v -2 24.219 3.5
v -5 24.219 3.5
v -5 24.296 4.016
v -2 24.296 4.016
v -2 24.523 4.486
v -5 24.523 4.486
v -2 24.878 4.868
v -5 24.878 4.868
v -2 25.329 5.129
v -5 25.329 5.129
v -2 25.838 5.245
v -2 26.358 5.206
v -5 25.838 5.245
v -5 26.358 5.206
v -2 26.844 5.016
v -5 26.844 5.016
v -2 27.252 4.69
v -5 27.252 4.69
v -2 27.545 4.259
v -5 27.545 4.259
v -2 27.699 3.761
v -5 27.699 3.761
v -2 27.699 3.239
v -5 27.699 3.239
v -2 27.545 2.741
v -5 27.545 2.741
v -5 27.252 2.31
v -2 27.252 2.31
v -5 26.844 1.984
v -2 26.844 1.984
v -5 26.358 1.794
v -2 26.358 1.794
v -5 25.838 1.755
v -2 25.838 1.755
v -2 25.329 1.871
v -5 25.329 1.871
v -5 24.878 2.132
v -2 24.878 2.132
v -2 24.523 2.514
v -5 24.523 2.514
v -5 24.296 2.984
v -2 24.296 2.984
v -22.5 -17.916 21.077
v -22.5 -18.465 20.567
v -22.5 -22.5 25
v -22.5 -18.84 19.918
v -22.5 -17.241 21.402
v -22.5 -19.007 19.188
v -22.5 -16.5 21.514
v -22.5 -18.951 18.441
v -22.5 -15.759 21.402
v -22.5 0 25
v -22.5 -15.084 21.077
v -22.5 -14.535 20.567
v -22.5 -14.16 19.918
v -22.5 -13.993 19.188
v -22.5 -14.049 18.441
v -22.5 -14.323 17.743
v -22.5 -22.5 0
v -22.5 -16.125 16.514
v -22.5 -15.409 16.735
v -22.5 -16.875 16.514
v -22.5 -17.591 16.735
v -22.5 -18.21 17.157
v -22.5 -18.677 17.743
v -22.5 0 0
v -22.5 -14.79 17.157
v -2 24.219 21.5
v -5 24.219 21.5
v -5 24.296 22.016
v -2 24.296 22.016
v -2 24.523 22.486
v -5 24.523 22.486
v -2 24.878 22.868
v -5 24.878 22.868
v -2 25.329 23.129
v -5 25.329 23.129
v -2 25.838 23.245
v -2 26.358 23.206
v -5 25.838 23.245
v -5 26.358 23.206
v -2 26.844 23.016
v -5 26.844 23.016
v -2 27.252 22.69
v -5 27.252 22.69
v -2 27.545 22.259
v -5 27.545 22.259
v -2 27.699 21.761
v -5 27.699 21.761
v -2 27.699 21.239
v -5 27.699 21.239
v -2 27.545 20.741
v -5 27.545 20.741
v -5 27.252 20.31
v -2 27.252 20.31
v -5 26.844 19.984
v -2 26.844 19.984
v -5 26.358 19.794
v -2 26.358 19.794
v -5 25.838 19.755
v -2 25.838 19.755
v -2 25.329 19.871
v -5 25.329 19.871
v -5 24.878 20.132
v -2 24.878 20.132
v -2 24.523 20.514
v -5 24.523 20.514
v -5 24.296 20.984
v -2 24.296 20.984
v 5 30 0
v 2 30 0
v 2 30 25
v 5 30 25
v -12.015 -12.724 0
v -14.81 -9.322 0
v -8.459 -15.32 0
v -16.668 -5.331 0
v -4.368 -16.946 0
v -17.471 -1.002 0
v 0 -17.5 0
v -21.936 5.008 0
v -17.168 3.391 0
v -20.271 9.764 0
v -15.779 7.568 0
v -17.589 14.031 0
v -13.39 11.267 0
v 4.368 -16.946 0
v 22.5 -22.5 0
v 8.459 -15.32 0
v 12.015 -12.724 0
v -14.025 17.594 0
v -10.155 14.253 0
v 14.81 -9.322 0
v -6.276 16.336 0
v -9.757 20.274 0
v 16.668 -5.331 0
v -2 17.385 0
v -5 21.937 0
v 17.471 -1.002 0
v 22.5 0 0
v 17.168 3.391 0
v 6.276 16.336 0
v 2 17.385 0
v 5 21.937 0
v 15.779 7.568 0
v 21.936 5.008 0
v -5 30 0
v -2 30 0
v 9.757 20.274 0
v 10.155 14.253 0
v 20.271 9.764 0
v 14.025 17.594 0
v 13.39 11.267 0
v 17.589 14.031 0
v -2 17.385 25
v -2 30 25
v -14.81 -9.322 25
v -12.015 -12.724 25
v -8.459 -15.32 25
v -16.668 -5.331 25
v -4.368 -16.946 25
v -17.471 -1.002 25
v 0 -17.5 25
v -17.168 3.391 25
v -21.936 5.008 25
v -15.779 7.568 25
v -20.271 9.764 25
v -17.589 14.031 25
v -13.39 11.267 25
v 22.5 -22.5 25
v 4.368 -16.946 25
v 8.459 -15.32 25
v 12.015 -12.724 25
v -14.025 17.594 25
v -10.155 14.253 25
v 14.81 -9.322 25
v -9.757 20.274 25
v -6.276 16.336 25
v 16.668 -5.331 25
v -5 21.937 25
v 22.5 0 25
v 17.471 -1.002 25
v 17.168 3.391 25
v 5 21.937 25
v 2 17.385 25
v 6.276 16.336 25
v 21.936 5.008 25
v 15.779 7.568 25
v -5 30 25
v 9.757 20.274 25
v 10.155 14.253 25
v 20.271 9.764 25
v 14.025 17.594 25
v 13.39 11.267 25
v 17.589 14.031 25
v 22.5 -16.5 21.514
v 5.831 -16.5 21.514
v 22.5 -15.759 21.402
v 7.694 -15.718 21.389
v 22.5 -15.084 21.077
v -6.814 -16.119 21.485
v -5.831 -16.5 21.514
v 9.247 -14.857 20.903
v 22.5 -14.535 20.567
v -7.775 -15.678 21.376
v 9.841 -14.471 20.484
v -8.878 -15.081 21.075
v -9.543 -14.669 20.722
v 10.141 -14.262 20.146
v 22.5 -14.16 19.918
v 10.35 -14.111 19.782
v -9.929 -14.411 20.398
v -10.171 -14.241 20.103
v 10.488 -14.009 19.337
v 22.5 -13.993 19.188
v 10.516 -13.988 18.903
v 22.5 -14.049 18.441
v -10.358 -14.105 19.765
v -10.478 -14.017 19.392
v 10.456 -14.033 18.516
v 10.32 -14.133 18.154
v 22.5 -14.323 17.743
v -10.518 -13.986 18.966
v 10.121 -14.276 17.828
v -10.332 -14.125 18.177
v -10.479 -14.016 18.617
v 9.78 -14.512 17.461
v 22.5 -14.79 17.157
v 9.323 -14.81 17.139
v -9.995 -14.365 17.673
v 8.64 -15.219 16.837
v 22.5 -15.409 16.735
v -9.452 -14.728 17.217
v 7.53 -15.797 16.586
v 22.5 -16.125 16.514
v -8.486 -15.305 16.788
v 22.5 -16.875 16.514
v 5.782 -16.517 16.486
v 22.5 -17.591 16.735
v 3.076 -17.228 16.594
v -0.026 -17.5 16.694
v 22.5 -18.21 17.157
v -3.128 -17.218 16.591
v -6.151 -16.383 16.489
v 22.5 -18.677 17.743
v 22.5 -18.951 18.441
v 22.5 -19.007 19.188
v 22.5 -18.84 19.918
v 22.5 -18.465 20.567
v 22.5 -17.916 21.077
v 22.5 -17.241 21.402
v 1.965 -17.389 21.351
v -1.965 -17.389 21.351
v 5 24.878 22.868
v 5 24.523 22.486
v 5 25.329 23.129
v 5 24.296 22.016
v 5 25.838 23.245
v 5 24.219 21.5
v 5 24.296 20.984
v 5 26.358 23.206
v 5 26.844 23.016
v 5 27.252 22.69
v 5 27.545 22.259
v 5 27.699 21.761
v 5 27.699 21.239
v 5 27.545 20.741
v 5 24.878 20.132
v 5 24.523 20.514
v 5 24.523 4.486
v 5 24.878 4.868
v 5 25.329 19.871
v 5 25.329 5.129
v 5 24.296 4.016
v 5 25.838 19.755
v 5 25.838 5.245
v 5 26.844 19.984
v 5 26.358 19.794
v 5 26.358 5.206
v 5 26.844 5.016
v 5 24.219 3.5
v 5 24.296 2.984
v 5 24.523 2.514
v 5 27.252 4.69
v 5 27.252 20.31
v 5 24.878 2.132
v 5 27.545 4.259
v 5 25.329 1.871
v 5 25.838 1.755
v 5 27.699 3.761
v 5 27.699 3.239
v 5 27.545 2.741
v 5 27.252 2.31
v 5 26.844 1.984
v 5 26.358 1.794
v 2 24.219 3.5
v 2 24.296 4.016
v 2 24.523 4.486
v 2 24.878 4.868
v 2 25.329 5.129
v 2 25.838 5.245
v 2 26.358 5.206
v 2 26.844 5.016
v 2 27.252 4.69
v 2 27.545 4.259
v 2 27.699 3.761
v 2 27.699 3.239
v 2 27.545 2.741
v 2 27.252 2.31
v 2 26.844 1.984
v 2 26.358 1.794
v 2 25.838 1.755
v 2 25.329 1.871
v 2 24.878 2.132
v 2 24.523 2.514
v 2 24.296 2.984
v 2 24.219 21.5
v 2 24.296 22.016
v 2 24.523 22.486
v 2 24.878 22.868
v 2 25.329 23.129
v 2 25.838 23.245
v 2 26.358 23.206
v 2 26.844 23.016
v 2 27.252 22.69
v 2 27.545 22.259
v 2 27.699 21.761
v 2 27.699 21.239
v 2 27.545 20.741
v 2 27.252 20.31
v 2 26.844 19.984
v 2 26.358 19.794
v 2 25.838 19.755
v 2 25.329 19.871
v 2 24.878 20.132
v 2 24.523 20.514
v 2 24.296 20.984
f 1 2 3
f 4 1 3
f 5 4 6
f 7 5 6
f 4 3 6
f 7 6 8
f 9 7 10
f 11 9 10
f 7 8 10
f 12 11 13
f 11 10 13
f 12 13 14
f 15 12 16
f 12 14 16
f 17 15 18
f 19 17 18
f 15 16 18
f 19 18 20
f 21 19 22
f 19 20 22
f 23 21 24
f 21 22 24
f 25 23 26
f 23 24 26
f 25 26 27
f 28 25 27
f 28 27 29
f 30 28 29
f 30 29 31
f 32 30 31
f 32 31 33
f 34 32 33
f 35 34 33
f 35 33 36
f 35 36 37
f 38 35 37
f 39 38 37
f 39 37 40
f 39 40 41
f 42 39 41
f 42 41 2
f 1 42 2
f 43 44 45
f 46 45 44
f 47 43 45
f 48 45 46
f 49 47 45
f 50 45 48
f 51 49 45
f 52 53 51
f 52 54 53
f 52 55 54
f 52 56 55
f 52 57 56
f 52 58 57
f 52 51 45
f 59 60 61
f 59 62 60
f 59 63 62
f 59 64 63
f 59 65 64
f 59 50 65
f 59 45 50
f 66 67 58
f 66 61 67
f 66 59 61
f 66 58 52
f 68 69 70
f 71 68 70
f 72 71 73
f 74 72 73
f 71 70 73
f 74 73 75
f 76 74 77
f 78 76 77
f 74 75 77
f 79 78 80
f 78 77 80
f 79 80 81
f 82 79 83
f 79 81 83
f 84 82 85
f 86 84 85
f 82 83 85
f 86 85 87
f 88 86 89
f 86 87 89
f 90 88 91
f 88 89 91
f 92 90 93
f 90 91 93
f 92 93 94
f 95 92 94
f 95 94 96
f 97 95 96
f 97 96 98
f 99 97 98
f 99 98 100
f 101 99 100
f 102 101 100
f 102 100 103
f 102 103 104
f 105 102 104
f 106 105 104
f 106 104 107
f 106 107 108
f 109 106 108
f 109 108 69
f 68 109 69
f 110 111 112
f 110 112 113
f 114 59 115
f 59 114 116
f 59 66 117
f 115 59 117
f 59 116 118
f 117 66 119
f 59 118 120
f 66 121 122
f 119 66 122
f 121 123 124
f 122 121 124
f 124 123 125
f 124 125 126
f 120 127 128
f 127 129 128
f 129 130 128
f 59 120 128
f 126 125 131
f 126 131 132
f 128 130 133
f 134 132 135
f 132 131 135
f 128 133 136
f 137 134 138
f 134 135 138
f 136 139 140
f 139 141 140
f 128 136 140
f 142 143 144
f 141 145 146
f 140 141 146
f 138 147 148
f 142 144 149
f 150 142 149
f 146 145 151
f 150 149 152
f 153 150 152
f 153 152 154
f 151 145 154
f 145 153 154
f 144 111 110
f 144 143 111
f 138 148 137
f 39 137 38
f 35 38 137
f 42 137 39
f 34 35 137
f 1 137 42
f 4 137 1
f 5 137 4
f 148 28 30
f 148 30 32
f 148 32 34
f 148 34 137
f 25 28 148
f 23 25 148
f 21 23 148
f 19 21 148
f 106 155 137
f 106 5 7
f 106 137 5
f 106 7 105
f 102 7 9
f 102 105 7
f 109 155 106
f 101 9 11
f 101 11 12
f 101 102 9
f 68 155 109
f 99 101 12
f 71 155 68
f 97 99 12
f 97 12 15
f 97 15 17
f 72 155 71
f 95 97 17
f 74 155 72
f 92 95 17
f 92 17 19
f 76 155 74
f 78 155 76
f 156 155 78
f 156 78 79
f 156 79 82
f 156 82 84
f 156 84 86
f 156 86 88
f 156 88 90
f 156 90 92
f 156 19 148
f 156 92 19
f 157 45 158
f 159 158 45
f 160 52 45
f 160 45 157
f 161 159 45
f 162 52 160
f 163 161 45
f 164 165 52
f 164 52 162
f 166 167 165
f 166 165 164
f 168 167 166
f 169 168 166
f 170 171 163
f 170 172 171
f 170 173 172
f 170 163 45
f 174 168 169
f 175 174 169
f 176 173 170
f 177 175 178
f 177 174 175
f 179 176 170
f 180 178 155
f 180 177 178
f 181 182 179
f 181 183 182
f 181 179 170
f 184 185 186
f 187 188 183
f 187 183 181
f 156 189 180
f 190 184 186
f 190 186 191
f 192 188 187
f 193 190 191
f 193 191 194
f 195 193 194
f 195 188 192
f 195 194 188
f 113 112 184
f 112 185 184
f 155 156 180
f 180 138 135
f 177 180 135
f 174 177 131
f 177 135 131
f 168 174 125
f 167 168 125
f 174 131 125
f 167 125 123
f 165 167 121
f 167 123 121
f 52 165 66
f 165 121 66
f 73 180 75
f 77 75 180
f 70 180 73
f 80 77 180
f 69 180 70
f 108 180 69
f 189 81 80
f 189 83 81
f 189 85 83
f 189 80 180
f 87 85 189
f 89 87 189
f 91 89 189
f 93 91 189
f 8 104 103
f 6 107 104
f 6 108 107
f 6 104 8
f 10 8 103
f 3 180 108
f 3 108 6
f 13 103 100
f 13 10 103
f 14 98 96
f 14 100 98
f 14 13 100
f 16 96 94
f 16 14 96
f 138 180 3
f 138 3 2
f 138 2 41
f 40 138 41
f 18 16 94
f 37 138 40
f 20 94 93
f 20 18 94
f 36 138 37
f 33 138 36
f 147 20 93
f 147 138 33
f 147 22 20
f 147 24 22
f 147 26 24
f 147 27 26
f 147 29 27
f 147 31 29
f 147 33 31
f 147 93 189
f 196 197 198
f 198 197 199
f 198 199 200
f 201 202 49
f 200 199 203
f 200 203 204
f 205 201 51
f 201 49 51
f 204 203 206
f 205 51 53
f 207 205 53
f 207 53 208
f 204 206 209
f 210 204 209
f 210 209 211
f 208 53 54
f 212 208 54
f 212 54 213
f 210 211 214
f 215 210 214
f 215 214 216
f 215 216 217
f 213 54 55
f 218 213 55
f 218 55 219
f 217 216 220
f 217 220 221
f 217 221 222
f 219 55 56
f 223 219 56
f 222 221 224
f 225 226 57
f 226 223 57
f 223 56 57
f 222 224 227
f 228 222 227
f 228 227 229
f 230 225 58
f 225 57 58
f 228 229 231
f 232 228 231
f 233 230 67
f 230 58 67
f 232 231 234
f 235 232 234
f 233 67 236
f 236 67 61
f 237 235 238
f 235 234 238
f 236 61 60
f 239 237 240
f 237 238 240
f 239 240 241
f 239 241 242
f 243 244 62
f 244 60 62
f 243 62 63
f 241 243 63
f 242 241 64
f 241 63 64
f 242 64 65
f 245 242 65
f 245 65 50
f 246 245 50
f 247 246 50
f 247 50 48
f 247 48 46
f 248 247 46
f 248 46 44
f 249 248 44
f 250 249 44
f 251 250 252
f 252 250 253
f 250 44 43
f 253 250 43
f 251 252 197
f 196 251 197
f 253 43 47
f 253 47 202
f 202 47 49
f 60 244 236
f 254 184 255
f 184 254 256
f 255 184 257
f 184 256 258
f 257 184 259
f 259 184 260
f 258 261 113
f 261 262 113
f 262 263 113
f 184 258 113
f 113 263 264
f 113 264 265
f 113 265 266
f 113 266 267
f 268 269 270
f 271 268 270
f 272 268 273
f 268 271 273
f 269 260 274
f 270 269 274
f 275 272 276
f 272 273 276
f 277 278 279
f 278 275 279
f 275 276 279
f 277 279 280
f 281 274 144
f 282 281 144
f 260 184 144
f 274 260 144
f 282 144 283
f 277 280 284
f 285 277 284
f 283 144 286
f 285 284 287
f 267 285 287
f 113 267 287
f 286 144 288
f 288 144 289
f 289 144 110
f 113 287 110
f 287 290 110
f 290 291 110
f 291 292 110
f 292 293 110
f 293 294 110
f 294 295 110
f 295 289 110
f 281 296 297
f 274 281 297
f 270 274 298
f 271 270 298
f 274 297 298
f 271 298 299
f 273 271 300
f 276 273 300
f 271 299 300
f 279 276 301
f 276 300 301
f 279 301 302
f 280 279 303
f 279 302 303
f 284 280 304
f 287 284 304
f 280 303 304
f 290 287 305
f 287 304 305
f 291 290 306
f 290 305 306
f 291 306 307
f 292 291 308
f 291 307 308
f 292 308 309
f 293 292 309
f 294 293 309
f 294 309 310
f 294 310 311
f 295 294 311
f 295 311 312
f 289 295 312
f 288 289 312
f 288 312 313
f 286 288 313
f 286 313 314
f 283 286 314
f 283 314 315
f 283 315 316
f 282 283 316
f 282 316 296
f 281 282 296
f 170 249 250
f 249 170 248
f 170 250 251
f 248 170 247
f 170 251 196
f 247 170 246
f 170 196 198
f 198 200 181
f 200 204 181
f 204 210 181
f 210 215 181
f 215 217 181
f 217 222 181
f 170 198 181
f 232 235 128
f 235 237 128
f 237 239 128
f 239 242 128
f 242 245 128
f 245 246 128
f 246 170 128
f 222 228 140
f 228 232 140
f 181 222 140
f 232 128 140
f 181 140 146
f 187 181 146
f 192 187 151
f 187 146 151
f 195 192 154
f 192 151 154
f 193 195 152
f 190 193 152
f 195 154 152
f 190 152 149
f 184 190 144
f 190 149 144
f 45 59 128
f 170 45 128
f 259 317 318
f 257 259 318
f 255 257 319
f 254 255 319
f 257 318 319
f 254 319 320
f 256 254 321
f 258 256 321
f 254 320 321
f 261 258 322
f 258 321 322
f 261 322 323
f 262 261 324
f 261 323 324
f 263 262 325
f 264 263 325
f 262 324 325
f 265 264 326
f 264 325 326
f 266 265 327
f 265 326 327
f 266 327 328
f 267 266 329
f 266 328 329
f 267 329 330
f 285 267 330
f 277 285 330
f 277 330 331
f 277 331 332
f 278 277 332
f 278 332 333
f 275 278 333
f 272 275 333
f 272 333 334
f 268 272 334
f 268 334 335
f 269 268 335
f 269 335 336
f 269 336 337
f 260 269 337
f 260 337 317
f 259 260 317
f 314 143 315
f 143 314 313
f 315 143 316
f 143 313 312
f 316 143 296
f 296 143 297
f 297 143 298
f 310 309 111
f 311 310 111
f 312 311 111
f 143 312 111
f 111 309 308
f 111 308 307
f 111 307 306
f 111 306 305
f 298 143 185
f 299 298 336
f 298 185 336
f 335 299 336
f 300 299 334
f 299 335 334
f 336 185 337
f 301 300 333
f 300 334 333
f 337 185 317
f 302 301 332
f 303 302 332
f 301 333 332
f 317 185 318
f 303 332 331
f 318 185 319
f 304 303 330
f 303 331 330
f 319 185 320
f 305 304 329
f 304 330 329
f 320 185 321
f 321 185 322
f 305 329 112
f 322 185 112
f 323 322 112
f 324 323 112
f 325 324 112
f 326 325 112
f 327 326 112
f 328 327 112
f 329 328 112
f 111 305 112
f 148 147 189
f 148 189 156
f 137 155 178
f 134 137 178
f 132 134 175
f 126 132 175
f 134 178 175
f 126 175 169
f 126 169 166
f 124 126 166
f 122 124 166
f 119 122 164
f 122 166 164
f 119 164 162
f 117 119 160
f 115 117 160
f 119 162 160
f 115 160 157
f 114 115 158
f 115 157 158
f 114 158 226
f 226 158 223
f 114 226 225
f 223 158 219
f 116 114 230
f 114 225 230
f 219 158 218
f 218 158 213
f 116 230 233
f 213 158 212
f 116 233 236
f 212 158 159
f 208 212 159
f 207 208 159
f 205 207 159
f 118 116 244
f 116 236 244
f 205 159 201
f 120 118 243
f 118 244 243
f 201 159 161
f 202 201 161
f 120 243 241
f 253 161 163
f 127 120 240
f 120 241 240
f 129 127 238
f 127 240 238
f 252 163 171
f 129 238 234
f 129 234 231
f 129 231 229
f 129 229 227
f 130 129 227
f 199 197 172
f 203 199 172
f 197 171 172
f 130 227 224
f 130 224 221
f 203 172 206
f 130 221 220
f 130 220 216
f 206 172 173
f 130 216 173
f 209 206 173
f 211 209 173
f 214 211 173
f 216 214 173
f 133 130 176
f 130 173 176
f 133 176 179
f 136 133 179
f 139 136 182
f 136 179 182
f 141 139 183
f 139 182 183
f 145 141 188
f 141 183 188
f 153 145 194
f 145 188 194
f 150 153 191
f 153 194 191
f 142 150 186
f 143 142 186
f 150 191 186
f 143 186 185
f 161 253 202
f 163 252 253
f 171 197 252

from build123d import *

# Parameters (mm, degrees)
SKETCH1_R           = 22.5
SKETCH1_W           = 10
SKETCH1_H           = 15
SKETCH1_W_2         = 45
SKETCH1_H_2         = 22.5
BOSS_EXTRUDE2_DEPTH = 25
SKETCH3_R           = 17.5
SKETCH3_W           = 4
SKETCH3_H           = 35
CUT_EXTRUDE2_DEPTH  = 25
SKETCH5_R           = 2.513863355
CUT_EXTRUDE3_DEPTH  = 60.581876439
SKETCH7_R           = 1.75
CUT_EXTRUDE4_DEPTH  = 48.762433046


with BuildPart() as part:
    # Sketch1 → Boss-Extrude2 (new body)
    with BuildSketch(Plane.XY):
        Circle(SKETCH1_R)
        with Locations((0, 22.5)):
            Rectangle(SKETCH1_W, SKETCH1_H)
        with Locations((0, -11.25)):
            Rectangle(SKETCH1_W_2, SKETCH1_H_2)
    extrude(amount=BOSS_EXTRUDE2_DEPTH)

    # Sketch3 → Cut-Extrude2 (cut)
    with BuildSketch(Plane.XY.offset(25)):
        Circle(SKETCH3_R)
        with Locations((0, 17.5)):
            Rectangle(SKETCH3_W, SKETCH3_H)
    extrude(amount=-CUT_EXTRUDE2_DEPTH, mode=Mode.SUBTRACT)

    # Sketch5 → Cut-Extrude3 (cut, through all)
    with BuildSketch(Plane.ZY.offset(22.5)):
        with Locations((19, -16.5)):
            Circle(SKETCH5_R)
    extrude(amount=-CUT_EXTRUDE3_DEPTH, mode=Mode.SUBTRACT)

    # Sketch7 → Cut-Extrude4 (cut, through all)
    with BuildSketch(Plane.ZY.offset(5)):
        with Locations(Location((3.5, 25.968705484, 0), (0, 0, 270))):
            Circle(SKETCH7_R)
        with Locations(Location((21.5, 25.968705484, 0), (0, 0, 270))):
            Circle(SKETCH7_R)
    extrude(amount=-CUT_EXTRUDE4_DEPTH, mode=Mode.SUBTRACT)


solid = part.part
